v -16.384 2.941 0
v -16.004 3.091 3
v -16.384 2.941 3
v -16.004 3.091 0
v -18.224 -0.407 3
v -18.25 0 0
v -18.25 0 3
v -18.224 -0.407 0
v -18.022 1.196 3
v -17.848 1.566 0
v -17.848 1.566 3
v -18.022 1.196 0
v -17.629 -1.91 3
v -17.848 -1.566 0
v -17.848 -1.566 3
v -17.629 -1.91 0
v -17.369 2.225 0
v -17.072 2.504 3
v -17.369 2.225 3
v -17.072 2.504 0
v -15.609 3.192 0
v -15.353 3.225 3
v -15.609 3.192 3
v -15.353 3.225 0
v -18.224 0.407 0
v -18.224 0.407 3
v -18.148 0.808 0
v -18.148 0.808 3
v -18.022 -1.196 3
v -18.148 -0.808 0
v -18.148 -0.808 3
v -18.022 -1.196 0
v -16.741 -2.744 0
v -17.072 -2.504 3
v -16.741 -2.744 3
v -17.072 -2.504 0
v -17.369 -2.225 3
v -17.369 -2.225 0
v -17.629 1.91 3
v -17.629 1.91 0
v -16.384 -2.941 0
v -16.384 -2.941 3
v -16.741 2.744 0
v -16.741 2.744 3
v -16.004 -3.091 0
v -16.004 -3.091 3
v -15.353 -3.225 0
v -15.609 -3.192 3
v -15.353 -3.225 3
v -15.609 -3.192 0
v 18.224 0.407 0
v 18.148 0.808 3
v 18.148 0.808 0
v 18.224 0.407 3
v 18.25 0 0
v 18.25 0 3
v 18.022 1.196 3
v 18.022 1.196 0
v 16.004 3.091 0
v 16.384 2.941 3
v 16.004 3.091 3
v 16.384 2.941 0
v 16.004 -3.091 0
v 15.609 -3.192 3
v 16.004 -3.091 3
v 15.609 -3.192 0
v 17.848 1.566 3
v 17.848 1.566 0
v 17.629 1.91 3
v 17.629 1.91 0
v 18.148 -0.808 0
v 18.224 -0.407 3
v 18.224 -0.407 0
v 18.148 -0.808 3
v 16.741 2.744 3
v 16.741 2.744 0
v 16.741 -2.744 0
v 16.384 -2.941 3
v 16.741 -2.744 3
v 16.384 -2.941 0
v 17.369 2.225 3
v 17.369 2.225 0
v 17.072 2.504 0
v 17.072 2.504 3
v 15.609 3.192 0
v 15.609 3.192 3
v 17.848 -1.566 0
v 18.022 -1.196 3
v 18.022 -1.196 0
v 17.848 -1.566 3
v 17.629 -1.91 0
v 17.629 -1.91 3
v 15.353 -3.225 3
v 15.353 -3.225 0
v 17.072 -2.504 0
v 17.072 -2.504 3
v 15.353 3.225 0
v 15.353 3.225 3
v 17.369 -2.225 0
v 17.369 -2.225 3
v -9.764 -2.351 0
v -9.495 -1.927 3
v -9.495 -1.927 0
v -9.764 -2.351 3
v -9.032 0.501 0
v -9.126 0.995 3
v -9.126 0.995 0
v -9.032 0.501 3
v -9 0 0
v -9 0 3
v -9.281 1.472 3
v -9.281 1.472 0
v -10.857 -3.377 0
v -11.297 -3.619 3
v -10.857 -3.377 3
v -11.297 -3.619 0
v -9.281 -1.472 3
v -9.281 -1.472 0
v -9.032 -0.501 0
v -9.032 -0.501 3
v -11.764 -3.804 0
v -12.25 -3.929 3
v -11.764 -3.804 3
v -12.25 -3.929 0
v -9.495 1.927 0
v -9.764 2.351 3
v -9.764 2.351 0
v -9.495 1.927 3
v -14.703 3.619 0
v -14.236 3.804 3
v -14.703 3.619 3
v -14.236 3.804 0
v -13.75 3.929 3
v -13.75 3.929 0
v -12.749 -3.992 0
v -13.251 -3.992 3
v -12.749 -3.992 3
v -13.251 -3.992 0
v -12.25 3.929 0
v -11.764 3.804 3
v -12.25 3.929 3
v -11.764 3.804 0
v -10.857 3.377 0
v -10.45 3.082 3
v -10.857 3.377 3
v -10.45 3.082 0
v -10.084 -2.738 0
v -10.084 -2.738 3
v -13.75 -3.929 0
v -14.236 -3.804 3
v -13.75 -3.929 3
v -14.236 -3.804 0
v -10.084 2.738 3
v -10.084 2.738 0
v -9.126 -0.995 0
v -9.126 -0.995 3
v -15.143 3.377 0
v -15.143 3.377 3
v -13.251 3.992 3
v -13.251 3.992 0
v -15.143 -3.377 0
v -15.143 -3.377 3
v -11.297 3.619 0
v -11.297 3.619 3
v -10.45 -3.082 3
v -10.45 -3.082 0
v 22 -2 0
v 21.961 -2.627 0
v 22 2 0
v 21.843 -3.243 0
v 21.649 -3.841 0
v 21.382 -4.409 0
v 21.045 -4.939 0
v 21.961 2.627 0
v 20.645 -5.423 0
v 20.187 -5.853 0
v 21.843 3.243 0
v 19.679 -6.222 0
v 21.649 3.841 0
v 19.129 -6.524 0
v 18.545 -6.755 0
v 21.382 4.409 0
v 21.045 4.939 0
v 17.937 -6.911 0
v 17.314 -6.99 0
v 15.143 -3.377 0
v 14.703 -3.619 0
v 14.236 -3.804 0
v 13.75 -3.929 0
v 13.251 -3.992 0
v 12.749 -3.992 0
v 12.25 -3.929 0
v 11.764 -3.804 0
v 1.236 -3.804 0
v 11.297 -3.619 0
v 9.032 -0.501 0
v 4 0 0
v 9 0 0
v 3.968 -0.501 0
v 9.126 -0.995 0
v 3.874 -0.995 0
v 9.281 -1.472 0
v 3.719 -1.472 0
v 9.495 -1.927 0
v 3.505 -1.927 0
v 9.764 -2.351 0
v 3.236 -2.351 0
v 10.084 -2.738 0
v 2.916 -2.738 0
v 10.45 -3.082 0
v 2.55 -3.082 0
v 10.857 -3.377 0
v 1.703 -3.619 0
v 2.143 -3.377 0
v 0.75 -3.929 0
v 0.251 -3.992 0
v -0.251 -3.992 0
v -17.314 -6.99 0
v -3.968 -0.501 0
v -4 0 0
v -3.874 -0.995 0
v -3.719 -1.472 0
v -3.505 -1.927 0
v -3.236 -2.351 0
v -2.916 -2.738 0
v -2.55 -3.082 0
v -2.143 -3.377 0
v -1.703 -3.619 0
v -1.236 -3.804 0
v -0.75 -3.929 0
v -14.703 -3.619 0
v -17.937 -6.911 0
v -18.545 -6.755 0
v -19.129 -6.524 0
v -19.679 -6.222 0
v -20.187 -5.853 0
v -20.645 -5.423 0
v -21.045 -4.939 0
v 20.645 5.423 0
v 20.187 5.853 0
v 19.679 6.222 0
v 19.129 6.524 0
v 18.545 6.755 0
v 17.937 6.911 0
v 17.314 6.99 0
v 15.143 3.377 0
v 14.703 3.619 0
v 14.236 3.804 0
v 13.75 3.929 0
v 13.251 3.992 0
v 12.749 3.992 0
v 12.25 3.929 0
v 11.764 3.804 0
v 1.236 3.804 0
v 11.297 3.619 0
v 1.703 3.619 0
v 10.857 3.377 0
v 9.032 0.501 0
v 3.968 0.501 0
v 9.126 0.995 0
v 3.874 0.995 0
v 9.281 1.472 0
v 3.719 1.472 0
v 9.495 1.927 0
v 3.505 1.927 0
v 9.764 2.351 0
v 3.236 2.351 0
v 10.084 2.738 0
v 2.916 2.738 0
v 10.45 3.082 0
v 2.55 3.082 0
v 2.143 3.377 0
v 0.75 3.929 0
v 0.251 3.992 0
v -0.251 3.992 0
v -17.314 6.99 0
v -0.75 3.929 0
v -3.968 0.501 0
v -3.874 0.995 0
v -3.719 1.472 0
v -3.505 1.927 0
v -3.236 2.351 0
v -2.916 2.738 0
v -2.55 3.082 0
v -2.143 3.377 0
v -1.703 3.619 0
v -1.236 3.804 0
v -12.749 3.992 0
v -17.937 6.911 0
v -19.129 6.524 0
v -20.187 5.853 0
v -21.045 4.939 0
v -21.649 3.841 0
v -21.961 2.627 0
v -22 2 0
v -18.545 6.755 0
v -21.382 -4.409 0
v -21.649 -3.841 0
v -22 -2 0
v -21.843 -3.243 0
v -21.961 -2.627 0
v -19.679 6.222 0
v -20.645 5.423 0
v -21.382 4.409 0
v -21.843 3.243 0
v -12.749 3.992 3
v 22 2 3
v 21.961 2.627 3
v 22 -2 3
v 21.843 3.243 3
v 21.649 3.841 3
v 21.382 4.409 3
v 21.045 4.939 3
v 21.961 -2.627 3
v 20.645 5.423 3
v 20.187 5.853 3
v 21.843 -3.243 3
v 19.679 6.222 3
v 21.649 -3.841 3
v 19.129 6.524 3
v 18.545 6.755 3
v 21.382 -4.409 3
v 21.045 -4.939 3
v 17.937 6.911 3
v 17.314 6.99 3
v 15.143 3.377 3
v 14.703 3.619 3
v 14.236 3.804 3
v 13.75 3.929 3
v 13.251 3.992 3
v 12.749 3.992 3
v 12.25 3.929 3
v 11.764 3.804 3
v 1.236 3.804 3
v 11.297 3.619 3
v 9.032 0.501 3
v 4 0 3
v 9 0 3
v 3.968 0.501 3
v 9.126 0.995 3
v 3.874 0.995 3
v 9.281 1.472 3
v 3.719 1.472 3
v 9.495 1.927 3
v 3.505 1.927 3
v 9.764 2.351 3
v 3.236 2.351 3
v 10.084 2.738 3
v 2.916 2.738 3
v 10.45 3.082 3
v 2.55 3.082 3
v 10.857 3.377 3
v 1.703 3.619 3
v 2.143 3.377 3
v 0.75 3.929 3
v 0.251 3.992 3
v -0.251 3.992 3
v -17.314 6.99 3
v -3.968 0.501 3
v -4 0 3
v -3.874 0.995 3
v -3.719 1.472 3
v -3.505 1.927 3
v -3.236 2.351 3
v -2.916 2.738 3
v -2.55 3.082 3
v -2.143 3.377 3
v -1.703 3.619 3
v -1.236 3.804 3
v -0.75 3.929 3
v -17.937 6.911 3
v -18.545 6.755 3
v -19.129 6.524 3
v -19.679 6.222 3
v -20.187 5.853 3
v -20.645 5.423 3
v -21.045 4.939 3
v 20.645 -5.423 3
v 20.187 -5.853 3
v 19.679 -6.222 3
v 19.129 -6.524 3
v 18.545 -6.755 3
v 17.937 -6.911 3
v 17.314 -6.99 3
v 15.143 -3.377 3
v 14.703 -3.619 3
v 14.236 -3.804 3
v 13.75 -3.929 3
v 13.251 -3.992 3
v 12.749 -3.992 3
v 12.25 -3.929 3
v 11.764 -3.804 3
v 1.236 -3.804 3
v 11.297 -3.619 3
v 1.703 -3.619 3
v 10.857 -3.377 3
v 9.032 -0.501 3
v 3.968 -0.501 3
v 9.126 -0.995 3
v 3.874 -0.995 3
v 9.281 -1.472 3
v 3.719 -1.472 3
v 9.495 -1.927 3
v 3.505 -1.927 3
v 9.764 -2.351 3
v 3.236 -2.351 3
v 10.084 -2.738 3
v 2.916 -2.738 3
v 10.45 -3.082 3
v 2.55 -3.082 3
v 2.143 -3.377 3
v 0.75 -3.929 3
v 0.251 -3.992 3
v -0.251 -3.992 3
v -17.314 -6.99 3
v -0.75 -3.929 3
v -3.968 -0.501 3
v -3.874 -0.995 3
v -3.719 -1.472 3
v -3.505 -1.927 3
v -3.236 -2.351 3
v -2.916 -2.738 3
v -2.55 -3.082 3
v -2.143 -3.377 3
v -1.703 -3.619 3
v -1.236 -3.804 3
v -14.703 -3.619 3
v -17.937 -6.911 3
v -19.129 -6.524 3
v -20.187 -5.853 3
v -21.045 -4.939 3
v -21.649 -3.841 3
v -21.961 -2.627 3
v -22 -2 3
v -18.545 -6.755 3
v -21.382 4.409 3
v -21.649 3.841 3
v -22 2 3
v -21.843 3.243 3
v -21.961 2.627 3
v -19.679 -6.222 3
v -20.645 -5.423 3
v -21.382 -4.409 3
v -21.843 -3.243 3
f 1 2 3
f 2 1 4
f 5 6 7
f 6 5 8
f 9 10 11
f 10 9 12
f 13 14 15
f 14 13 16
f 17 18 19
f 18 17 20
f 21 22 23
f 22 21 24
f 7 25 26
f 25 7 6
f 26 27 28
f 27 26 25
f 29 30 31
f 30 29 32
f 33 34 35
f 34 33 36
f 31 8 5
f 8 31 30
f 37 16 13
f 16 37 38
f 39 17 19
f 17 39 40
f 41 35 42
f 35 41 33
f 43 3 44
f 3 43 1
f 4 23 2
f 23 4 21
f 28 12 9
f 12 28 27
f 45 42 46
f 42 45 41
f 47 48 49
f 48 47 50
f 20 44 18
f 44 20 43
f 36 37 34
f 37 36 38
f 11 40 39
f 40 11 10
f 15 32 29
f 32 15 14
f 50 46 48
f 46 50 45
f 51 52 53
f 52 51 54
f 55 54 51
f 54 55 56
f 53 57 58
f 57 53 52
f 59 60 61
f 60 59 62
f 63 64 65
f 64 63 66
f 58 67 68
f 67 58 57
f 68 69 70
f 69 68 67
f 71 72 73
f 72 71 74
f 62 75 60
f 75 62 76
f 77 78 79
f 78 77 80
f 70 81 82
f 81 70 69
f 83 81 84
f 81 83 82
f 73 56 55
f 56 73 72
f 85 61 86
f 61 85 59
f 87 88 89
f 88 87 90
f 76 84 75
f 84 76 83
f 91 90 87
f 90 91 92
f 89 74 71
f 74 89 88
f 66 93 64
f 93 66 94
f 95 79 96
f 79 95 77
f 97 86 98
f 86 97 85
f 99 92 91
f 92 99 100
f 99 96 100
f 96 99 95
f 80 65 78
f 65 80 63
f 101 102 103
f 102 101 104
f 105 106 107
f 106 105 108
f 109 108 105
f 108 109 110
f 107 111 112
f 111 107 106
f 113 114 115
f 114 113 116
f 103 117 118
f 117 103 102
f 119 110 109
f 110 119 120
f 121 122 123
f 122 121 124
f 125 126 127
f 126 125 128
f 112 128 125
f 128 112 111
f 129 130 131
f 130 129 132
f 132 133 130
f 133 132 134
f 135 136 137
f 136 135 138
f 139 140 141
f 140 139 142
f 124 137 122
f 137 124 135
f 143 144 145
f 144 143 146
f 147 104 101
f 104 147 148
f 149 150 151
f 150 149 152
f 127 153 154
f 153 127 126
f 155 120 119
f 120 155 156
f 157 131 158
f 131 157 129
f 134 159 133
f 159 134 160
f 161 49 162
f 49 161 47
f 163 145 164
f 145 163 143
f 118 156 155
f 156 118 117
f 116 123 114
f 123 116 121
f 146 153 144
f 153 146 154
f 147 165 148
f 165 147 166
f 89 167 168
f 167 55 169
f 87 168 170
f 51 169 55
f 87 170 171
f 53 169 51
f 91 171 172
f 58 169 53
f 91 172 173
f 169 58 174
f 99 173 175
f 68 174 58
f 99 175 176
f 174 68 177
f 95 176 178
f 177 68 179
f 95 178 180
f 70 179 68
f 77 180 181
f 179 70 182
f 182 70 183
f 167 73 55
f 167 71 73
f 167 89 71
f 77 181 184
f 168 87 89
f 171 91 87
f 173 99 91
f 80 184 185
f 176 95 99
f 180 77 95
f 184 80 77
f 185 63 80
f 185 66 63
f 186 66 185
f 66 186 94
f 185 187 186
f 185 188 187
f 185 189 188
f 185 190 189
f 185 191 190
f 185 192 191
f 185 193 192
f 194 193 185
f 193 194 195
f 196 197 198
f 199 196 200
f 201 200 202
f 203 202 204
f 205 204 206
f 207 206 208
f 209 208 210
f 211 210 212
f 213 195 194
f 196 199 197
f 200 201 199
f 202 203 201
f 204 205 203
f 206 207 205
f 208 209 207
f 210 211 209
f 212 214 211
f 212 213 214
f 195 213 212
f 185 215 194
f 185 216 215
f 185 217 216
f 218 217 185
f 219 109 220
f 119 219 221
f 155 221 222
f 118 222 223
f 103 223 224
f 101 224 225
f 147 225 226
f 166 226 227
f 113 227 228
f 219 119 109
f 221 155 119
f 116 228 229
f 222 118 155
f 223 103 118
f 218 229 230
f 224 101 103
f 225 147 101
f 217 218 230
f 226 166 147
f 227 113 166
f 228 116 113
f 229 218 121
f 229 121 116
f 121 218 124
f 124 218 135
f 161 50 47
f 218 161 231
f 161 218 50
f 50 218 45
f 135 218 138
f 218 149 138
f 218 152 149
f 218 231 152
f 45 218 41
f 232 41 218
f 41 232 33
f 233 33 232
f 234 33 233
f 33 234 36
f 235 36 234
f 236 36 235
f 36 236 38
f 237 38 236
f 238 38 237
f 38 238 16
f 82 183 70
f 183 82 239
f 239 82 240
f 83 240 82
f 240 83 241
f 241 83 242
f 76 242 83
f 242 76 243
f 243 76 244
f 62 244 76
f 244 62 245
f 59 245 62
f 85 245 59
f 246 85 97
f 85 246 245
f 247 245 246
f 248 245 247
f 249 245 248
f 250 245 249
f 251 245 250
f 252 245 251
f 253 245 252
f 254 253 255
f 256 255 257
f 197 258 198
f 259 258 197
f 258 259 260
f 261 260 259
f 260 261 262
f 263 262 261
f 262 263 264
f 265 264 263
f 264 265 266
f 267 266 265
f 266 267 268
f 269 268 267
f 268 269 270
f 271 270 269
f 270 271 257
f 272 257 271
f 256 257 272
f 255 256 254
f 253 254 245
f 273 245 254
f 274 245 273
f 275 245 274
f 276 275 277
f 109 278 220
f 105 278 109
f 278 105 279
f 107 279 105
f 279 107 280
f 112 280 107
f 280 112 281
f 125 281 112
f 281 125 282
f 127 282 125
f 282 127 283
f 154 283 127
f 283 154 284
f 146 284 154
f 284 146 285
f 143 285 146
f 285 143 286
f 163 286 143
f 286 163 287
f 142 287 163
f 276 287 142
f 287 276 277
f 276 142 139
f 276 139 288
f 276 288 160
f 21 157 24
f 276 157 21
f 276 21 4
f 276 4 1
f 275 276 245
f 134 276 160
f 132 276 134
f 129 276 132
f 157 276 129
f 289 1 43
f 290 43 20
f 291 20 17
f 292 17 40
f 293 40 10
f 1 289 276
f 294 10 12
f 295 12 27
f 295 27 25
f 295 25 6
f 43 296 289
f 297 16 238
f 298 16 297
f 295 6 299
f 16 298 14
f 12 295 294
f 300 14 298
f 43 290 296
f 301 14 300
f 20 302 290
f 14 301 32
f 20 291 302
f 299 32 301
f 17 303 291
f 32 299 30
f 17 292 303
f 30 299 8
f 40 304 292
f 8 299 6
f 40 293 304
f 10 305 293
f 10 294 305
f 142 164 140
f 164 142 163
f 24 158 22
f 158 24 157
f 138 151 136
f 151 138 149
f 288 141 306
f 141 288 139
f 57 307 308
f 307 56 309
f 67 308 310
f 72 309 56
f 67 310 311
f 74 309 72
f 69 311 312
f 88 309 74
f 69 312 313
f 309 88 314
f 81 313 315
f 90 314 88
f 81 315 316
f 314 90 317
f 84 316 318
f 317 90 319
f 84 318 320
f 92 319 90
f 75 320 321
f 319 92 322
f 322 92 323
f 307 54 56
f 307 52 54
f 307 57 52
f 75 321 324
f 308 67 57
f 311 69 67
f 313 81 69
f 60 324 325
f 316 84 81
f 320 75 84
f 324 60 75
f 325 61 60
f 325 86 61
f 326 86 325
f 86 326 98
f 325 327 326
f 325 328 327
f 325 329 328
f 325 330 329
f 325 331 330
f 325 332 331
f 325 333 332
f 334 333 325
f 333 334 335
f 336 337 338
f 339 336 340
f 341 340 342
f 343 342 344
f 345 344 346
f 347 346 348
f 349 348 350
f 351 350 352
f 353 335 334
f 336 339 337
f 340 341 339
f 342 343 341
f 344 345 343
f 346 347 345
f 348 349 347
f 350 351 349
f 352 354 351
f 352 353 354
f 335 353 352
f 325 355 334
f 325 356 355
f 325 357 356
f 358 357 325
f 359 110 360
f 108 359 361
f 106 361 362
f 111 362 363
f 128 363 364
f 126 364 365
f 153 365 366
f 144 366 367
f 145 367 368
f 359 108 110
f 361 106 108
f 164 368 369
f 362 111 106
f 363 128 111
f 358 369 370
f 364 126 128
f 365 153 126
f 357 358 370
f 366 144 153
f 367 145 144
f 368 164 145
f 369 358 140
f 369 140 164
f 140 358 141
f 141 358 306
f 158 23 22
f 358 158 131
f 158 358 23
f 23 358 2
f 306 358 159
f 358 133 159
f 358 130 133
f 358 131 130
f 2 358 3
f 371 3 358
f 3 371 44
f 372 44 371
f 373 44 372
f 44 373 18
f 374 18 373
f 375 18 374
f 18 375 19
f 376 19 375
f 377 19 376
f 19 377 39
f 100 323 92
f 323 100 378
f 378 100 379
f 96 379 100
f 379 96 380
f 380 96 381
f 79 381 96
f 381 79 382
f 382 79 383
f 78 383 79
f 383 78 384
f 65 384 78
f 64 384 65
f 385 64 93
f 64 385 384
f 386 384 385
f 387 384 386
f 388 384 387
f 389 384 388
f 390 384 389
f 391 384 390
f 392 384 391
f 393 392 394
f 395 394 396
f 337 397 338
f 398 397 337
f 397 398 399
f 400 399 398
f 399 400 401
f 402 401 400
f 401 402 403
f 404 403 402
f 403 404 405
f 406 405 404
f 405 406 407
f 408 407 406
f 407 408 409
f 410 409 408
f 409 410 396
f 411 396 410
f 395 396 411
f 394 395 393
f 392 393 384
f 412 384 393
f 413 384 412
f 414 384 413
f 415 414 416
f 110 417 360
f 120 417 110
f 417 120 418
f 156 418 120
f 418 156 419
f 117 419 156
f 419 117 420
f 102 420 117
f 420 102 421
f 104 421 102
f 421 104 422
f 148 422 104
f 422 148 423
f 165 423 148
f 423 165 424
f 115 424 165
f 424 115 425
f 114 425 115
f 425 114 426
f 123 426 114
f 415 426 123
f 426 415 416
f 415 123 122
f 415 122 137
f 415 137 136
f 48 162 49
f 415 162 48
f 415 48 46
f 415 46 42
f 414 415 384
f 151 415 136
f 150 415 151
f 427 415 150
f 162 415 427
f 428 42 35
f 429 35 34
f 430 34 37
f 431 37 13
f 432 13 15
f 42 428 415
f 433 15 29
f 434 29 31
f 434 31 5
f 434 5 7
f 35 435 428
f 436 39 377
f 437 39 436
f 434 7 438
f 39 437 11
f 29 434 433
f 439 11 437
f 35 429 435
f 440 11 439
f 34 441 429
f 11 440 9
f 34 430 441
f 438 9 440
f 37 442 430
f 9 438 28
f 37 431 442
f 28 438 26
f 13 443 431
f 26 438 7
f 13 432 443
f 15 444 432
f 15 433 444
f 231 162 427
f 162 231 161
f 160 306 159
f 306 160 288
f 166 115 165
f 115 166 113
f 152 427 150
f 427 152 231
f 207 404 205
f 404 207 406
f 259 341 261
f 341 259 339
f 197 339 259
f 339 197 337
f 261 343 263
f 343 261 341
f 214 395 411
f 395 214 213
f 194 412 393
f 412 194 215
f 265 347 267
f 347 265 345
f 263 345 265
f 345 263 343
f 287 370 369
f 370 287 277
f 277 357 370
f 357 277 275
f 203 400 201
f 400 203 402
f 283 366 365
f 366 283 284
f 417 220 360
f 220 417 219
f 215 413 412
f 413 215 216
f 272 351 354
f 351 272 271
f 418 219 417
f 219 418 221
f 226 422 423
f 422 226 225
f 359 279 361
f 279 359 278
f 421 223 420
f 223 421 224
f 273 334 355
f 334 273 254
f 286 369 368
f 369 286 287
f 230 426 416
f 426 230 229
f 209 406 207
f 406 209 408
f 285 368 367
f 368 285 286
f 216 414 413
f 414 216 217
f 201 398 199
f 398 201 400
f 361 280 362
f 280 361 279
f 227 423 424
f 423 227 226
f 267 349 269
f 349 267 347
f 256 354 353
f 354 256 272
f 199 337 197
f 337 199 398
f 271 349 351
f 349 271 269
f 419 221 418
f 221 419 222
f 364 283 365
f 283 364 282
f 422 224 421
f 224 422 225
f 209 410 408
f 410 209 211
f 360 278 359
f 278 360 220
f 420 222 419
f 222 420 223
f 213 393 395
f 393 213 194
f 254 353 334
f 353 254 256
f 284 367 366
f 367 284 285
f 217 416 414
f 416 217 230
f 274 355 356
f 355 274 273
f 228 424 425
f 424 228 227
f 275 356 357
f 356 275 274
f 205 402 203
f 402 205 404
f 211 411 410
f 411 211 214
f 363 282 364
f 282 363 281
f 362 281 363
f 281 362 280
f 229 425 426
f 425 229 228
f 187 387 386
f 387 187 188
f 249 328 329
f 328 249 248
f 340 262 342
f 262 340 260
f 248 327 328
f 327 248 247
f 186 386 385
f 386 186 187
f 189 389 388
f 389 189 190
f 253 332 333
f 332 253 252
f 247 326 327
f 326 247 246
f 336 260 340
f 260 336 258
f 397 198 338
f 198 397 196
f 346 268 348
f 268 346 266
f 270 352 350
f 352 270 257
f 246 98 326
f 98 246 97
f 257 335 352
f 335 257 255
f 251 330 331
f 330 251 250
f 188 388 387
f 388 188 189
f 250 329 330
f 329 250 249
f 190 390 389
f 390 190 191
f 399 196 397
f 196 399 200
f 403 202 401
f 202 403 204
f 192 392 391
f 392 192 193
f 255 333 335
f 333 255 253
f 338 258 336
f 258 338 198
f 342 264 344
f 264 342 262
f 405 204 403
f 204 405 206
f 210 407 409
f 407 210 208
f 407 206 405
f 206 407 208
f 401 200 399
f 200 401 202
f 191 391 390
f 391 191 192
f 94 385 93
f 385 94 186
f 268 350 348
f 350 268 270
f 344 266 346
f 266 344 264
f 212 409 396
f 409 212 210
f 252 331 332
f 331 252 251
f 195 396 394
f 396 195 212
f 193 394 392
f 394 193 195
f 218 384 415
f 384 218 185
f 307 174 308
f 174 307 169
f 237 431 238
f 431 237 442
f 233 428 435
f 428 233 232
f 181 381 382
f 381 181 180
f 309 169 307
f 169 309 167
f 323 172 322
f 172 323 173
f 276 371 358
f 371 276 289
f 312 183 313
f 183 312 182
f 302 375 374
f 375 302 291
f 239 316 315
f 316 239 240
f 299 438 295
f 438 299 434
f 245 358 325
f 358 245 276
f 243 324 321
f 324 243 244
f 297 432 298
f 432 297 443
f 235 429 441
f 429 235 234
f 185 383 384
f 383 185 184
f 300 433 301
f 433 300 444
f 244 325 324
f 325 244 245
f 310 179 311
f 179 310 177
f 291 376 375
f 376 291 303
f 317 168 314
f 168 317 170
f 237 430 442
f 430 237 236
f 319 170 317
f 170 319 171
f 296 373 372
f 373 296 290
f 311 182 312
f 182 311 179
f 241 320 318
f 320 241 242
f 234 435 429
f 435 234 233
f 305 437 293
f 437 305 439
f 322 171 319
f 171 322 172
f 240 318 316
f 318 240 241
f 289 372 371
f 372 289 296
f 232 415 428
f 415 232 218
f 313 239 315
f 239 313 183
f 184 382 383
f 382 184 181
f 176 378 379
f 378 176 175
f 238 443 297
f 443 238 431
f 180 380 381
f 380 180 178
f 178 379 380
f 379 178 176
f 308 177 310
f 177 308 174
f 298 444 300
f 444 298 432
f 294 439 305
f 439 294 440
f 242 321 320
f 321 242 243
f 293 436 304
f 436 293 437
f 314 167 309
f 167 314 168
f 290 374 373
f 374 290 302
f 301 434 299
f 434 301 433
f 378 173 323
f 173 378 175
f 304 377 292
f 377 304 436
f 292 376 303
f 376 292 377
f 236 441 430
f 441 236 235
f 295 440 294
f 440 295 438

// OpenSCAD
$fn = 50;


difference() {
	union() {
		hull() {
			translate(v = [-17.0000000000, 2.0000000000, 0]) {
				cylinder(h = 3, r = 5);
			}
			translate(v = [17.0000000000, 2.0000000000, 0]) {
				cylinder(h = 3, r = 5);
			}
			translate(v = [-17.0000000000, -2.0000000000, 0]) {
				cylinder(h = 3, r = 5);
			}
			translate(v = [17.0000000000, -2.0000000000, 0]) {
				cylinder(h = 3, r = 5);
			}
		}
	}
	union() {
		#translate(v = [-15.0000000000, 0.0000000000, -100.0000000000]) {
			cylinder(h = 200, r = 3.2500000000);
		}
		#translate(v = [-15.0000000000, 0.0000000000, -100.0000000000]) {
			cylinder(h = 200, r = 3.2500000000);
		}
		#translate(v = [15.0000000000, 0.0000000000, -100.0000000000]) {
			cylinder(h = 200, r = 3.2500000000);
		}
		#translate(v = [15.0000000000, 0.0000000000, -100.0000000000]) {
			cylinder(h = 200, r = 3.2500000000);
		}
		#translate(v = [-13.0000000000, 0, 0]) {
			cylinder(h = 3, r = 4.0000000000);
		}
		#cylinder(h = 3, r = 4.0000000000);
		#translate(v = [13.0000000000, 0, 0]) {
			cylinder(h = 3, r = 4.0000000000);
		}
	}
}
